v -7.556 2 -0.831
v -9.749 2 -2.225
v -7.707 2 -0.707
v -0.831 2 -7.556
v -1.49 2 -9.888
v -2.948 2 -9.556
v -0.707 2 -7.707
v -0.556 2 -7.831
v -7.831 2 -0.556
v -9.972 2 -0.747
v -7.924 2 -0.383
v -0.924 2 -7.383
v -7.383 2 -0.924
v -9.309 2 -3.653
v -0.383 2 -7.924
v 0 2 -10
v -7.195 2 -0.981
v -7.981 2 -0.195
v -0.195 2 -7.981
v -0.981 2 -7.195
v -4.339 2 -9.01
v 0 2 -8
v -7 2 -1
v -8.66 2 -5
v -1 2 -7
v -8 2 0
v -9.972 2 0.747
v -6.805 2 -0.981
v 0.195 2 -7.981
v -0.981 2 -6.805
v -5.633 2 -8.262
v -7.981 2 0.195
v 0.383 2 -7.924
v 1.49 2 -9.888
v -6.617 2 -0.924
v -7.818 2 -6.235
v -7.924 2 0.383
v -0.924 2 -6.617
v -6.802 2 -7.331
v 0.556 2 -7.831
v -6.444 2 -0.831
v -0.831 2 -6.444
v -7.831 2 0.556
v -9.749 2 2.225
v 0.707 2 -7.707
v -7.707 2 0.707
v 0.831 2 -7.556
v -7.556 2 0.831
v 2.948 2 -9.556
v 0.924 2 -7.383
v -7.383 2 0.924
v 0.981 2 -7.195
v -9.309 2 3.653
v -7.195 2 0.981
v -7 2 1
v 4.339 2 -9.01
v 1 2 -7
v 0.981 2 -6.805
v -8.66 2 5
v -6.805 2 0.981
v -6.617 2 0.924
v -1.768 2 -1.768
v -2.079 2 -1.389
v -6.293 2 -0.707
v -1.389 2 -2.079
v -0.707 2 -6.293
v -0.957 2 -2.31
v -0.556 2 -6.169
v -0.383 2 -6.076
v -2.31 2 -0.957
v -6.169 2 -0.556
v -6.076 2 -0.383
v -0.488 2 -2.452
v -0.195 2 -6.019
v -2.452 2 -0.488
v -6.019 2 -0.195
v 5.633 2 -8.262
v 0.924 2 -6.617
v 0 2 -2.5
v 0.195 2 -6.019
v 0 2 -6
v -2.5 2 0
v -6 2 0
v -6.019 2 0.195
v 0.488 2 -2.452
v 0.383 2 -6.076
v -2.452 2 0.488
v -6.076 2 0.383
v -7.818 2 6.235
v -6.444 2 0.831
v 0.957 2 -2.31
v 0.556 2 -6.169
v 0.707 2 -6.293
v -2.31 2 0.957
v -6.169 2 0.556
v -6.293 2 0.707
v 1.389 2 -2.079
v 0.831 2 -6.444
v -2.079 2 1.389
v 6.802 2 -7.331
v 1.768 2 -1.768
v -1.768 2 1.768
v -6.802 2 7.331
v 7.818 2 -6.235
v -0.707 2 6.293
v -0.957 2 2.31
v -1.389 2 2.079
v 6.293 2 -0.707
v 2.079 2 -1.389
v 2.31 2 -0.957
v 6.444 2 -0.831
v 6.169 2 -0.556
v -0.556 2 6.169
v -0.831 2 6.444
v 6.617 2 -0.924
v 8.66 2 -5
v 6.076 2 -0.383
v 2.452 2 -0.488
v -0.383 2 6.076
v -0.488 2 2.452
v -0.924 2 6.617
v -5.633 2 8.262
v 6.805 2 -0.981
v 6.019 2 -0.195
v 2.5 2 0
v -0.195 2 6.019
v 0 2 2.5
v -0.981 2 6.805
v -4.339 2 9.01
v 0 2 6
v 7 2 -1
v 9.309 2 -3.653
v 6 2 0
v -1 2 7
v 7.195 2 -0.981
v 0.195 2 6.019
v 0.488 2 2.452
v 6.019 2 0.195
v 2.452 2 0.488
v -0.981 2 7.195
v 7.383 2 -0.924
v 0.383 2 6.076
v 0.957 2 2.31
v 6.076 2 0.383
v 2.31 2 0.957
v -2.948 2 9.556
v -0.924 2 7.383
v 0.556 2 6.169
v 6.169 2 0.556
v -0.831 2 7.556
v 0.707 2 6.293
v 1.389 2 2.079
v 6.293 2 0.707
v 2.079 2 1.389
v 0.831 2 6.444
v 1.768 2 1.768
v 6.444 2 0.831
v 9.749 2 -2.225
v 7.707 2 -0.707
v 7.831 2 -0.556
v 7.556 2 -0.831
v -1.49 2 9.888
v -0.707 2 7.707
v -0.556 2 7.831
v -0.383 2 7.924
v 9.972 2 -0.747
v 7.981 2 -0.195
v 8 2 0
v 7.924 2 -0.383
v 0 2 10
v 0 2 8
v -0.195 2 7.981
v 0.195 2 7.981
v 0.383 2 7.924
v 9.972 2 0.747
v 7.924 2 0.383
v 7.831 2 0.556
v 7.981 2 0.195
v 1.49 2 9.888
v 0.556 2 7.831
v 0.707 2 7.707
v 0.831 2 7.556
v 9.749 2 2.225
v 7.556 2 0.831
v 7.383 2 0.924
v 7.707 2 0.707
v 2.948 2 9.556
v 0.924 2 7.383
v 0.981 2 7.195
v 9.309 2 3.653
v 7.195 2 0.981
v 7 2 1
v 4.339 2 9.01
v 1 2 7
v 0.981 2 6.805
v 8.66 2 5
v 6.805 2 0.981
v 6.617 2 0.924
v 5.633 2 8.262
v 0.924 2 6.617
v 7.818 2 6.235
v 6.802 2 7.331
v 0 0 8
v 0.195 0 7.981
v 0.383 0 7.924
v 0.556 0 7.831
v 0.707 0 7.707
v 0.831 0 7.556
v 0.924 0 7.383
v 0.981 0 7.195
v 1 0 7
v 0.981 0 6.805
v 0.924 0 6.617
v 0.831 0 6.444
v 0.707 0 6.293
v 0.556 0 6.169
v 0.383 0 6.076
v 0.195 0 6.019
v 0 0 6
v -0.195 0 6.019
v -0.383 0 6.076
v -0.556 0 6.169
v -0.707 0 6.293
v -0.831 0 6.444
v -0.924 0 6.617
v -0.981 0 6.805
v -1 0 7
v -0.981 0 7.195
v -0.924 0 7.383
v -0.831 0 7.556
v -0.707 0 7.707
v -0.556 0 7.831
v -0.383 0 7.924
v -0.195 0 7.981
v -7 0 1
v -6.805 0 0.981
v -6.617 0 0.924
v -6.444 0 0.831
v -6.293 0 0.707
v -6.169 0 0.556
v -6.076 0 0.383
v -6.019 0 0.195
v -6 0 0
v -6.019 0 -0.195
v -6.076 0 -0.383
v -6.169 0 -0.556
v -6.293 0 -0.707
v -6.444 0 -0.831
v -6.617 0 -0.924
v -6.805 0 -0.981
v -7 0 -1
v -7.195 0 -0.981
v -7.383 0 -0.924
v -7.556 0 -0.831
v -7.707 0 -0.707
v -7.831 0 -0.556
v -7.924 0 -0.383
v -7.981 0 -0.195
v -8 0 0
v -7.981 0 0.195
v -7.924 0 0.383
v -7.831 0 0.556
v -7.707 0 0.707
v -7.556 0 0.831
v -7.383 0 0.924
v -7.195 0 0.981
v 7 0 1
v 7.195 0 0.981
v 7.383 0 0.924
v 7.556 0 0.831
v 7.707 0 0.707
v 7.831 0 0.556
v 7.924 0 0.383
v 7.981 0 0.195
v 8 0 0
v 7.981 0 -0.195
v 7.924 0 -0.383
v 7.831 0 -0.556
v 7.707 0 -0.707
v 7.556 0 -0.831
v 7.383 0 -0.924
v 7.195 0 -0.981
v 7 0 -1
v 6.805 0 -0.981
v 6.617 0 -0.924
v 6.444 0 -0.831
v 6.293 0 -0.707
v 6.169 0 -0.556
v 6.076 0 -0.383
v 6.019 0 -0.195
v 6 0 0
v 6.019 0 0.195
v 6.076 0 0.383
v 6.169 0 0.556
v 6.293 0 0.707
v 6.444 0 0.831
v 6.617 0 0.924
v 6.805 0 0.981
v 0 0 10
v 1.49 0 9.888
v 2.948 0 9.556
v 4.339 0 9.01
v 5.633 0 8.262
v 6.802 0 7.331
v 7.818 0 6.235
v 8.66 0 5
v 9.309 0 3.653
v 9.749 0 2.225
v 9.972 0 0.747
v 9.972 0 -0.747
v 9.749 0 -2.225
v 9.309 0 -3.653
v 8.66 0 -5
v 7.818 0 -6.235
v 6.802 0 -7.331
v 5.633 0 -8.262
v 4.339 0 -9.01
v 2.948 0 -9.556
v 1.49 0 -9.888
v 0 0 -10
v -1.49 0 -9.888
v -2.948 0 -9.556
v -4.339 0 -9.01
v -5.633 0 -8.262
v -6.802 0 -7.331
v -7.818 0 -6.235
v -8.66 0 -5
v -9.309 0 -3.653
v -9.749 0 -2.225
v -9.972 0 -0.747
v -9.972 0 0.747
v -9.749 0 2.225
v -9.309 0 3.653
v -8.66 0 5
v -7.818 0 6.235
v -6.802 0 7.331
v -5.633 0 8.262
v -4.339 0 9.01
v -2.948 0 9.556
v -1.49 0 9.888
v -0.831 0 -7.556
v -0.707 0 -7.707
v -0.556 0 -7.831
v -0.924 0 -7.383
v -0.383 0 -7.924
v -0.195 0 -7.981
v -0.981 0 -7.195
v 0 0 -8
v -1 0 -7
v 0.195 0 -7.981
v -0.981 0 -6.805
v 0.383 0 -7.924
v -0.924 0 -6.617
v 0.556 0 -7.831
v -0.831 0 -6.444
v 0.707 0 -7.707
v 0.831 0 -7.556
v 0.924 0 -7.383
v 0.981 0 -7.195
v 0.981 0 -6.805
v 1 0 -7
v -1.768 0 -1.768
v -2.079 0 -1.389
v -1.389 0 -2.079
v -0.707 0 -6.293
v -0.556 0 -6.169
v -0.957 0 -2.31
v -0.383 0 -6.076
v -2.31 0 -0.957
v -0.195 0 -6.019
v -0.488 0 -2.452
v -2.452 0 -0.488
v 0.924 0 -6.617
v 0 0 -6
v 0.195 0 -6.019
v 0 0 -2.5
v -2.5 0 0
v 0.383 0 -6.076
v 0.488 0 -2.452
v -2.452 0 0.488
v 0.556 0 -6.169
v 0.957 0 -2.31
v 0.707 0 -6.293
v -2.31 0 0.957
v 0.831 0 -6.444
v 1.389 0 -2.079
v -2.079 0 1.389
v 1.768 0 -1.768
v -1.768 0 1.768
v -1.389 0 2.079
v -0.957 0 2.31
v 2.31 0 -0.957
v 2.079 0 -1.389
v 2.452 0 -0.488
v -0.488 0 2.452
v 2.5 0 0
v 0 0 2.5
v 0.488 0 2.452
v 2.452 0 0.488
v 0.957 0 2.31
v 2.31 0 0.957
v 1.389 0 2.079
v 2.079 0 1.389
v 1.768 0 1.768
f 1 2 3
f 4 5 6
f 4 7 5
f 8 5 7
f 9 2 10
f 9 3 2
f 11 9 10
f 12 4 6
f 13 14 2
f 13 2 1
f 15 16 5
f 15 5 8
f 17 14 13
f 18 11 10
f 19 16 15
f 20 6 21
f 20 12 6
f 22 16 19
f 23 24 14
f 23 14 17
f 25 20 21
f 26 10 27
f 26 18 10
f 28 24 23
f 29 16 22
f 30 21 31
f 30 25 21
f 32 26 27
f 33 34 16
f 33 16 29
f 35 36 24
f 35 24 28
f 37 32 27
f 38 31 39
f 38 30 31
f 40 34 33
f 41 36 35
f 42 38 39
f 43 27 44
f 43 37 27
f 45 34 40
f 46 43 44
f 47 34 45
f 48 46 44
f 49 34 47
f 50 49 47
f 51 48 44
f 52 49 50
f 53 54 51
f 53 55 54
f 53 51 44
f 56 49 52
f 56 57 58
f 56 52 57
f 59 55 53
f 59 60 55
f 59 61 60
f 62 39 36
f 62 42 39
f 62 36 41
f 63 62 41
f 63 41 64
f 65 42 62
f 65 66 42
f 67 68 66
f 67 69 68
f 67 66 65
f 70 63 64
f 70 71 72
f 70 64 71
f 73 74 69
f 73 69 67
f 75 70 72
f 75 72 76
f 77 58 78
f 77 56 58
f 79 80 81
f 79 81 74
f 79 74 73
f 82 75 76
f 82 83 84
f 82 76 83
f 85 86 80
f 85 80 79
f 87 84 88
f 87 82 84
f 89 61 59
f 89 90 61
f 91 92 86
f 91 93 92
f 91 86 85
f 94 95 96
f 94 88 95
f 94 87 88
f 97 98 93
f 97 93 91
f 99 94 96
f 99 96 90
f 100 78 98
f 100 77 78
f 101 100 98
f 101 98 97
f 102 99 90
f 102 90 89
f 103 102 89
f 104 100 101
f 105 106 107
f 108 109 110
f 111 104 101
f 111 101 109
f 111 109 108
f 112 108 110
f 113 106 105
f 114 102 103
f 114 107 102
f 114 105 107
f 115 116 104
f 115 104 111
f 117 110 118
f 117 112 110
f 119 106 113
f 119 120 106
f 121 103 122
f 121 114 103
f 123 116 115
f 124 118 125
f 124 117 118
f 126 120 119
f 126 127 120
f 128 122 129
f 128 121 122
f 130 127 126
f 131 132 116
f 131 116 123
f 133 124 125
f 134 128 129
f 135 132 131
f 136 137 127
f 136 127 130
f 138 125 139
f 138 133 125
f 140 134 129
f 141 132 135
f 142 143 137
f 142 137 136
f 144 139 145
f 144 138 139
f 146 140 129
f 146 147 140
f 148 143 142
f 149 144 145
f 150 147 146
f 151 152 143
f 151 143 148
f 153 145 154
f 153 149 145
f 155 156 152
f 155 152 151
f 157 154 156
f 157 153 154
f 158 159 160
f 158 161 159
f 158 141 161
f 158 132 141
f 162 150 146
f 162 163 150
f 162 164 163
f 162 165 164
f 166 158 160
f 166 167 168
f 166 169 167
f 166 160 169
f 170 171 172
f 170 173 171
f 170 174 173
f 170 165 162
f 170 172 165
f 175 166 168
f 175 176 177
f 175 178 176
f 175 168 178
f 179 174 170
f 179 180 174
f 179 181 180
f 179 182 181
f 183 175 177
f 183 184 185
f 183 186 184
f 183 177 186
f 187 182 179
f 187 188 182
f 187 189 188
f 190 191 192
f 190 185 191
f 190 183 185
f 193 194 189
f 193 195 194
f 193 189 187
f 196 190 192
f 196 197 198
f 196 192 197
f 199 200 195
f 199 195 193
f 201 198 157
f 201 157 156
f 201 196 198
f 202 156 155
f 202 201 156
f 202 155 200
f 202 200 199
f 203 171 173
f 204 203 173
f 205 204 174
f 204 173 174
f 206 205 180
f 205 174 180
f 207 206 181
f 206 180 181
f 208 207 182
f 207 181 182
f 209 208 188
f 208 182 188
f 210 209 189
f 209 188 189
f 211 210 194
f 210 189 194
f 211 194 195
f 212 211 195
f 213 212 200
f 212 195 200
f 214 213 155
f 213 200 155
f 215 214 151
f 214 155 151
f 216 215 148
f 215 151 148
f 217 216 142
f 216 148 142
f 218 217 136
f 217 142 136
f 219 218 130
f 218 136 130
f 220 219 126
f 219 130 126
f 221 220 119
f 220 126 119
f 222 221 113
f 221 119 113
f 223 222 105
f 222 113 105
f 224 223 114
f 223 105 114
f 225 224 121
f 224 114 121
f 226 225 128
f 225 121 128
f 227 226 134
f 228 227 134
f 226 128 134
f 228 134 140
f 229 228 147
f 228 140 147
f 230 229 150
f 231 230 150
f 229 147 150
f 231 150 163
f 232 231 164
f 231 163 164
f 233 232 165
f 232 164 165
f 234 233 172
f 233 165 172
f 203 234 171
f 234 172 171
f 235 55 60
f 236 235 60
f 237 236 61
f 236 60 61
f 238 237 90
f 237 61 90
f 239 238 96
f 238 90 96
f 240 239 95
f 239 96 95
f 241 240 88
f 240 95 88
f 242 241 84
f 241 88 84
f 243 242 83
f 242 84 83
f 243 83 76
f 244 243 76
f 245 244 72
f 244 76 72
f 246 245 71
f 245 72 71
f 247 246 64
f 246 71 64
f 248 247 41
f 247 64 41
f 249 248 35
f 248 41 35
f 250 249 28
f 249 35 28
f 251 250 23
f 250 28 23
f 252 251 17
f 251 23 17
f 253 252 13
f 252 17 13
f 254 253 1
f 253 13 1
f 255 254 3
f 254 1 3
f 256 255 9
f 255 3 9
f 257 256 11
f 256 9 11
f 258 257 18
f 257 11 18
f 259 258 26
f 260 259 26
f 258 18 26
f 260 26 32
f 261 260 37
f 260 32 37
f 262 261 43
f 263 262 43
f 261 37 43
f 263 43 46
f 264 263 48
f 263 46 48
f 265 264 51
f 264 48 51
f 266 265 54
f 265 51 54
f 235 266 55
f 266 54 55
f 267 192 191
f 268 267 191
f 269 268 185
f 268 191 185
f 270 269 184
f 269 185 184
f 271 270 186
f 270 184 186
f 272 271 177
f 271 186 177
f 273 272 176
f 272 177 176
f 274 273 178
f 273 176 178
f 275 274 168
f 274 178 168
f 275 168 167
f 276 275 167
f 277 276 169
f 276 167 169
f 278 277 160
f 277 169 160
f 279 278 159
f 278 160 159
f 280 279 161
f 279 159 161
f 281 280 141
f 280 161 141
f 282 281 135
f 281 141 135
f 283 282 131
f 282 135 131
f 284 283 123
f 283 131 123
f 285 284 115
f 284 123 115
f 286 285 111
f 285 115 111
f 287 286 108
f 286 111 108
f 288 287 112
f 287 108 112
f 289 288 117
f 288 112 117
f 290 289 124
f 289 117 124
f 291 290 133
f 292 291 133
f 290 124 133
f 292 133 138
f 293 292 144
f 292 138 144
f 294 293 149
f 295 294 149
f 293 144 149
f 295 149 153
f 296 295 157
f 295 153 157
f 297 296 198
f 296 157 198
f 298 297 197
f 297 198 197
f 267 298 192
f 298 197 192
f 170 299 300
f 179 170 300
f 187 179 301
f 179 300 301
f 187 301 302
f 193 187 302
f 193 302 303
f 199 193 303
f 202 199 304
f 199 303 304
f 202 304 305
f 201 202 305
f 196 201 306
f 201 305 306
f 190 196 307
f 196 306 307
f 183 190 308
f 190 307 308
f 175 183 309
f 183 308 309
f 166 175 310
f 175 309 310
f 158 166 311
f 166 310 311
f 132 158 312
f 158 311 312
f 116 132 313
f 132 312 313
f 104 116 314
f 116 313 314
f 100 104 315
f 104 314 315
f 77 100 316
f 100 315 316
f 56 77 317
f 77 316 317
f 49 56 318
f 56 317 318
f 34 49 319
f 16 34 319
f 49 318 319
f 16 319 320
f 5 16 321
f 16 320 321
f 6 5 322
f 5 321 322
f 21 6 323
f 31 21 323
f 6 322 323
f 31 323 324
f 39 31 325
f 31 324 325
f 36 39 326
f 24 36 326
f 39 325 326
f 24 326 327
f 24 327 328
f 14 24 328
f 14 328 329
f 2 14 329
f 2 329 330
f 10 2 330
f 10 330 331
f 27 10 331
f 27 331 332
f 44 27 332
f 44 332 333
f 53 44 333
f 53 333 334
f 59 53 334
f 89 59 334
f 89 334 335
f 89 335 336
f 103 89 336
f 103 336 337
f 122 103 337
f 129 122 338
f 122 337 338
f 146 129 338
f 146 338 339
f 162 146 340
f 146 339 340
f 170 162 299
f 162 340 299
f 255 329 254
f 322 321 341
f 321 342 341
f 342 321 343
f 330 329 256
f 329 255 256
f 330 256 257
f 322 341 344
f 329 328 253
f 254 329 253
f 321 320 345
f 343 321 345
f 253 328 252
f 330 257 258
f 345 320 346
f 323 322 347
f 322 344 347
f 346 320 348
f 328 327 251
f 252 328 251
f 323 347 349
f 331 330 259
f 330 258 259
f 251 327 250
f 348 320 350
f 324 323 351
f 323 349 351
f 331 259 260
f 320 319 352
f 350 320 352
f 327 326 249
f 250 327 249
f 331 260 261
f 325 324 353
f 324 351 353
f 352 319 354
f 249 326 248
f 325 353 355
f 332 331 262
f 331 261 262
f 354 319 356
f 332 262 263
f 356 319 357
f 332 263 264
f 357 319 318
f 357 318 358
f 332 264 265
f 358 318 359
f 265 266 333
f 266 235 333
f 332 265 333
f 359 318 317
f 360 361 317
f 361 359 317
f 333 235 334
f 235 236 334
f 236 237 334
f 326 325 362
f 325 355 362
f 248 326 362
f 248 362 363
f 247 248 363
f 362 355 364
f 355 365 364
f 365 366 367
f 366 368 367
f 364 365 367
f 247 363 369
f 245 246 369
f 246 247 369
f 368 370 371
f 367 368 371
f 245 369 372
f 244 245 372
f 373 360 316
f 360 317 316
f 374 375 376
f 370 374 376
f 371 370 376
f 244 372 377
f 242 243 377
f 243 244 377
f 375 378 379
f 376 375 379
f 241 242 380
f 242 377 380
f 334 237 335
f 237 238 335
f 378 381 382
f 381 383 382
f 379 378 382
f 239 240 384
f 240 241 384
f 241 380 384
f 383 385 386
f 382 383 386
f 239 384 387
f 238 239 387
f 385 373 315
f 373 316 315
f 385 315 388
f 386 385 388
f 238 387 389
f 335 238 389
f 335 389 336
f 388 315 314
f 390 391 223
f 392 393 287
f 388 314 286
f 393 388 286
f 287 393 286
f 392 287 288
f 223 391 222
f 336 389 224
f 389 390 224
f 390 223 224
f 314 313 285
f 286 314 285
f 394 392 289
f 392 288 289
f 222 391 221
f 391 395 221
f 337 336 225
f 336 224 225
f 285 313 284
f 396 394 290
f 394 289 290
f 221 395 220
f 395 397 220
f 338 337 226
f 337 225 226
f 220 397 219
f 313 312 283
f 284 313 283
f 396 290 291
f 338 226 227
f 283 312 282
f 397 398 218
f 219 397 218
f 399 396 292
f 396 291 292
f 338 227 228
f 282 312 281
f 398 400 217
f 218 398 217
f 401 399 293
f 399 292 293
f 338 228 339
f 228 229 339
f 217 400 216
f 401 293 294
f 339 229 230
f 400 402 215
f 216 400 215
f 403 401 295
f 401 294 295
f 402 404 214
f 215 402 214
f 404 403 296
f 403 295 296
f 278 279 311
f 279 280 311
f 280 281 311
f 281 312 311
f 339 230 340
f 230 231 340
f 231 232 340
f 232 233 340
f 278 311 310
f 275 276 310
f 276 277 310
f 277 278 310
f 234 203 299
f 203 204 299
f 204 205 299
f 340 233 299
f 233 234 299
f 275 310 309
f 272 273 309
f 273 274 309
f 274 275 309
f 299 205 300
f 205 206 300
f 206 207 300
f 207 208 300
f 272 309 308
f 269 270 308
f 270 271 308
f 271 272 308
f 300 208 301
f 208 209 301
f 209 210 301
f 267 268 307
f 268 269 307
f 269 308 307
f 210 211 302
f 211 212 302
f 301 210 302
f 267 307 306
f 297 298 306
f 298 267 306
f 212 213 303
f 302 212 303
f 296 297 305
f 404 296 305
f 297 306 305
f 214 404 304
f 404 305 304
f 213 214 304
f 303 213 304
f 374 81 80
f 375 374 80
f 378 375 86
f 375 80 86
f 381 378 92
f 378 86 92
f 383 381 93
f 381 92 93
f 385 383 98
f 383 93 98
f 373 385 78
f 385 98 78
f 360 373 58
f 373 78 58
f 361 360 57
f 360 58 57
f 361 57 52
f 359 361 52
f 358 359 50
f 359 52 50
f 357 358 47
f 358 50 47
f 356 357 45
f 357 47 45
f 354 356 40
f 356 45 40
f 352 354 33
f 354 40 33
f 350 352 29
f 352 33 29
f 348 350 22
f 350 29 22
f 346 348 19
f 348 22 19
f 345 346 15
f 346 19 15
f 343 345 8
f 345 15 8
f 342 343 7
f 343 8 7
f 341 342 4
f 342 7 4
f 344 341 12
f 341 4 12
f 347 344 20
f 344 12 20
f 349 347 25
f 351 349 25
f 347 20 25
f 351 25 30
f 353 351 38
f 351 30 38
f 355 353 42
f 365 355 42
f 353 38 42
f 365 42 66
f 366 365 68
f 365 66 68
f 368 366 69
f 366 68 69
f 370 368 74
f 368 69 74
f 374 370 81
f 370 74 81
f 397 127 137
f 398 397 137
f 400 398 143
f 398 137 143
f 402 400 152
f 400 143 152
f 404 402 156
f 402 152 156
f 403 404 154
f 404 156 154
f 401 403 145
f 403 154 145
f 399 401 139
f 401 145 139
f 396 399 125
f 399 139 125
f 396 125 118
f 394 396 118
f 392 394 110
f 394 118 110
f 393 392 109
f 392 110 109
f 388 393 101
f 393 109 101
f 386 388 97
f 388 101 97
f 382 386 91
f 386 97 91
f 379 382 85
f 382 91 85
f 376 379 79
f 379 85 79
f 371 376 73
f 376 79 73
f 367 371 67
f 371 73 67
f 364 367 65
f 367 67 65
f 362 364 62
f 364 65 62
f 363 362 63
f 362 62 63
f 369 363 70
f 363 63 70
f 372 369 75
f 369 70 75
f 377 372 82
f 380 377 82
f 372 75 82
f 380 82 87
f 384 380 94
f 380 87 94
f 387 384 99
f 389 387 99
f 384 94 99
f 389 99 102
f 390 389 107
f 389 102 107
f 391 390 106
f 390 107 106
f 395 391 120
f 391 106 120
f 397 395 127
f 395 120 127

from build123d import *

# Parameters (mm, degrees)
SKETCH1_R           = 10
BOSS_EXTRUDE1_DEPTH = 2
SKETCH2_R           = 2.5
CUT_EXTRUDE1_DEPTH  = 2
SKETCH3_R           = 1
CUT_EXTRUDE2_DEPTH  = 2


with BuildPart() as part:
    # Sketch1 → Boss-Extrude1 (new body)
    with BuildSketch(Plane(origin=(0, 0, 0), x_dir=(1, 0, 0), z_dir=(0, 1, 0))):
        with Locations(Location((0, 0, 0), (0, 0, 270))):
            Circle(SKETCH1_R)
    extrude(amount=BOSS_EXTRUDE1_DEPTH)

    # Sketch2 → Cut-Extrude1 (cut)
    with BuildSketch(Plane(origin=(0, 2, 0), x_dir=(1, 0, 0), z_dir=(0, 1, 0))):
        with Locations(Location((0, 0, 0), (0, 0, 270))):
            Circle(SKETCH2_R)
    extrude(amount=-CUT_EXTRUDE1_DEPTH, mode=Mode.SUBTRACT)

    # Sketch3 → Cut-Extrude2 (cut)
    with BuildSketch(Plane(origin=(0, 2, 0), x_dir=(1, 0, 0), z_dir=(0, 1, 0))):
        with Locations(Location((7, 0, 0), (0, 0, 270))):
            Circle(SKETCH3_R)
        with Locations(Location((0, -7, 0), (0, 0, 270))):
            Circle(SKETCH3_R)
        with Locations(Location((-7, 0, 0), (0, 0, 270))):
            Circle(SKETCH3_R)
        with Locations(Location((0, 7, 0), (0, 0, 270))):
            Circle(SKETCH3_R)
    extrude(amount=-CUT_EXTRUDE2_DEPTH, mode=Mode.SUBTRACT)


solid = part.part
